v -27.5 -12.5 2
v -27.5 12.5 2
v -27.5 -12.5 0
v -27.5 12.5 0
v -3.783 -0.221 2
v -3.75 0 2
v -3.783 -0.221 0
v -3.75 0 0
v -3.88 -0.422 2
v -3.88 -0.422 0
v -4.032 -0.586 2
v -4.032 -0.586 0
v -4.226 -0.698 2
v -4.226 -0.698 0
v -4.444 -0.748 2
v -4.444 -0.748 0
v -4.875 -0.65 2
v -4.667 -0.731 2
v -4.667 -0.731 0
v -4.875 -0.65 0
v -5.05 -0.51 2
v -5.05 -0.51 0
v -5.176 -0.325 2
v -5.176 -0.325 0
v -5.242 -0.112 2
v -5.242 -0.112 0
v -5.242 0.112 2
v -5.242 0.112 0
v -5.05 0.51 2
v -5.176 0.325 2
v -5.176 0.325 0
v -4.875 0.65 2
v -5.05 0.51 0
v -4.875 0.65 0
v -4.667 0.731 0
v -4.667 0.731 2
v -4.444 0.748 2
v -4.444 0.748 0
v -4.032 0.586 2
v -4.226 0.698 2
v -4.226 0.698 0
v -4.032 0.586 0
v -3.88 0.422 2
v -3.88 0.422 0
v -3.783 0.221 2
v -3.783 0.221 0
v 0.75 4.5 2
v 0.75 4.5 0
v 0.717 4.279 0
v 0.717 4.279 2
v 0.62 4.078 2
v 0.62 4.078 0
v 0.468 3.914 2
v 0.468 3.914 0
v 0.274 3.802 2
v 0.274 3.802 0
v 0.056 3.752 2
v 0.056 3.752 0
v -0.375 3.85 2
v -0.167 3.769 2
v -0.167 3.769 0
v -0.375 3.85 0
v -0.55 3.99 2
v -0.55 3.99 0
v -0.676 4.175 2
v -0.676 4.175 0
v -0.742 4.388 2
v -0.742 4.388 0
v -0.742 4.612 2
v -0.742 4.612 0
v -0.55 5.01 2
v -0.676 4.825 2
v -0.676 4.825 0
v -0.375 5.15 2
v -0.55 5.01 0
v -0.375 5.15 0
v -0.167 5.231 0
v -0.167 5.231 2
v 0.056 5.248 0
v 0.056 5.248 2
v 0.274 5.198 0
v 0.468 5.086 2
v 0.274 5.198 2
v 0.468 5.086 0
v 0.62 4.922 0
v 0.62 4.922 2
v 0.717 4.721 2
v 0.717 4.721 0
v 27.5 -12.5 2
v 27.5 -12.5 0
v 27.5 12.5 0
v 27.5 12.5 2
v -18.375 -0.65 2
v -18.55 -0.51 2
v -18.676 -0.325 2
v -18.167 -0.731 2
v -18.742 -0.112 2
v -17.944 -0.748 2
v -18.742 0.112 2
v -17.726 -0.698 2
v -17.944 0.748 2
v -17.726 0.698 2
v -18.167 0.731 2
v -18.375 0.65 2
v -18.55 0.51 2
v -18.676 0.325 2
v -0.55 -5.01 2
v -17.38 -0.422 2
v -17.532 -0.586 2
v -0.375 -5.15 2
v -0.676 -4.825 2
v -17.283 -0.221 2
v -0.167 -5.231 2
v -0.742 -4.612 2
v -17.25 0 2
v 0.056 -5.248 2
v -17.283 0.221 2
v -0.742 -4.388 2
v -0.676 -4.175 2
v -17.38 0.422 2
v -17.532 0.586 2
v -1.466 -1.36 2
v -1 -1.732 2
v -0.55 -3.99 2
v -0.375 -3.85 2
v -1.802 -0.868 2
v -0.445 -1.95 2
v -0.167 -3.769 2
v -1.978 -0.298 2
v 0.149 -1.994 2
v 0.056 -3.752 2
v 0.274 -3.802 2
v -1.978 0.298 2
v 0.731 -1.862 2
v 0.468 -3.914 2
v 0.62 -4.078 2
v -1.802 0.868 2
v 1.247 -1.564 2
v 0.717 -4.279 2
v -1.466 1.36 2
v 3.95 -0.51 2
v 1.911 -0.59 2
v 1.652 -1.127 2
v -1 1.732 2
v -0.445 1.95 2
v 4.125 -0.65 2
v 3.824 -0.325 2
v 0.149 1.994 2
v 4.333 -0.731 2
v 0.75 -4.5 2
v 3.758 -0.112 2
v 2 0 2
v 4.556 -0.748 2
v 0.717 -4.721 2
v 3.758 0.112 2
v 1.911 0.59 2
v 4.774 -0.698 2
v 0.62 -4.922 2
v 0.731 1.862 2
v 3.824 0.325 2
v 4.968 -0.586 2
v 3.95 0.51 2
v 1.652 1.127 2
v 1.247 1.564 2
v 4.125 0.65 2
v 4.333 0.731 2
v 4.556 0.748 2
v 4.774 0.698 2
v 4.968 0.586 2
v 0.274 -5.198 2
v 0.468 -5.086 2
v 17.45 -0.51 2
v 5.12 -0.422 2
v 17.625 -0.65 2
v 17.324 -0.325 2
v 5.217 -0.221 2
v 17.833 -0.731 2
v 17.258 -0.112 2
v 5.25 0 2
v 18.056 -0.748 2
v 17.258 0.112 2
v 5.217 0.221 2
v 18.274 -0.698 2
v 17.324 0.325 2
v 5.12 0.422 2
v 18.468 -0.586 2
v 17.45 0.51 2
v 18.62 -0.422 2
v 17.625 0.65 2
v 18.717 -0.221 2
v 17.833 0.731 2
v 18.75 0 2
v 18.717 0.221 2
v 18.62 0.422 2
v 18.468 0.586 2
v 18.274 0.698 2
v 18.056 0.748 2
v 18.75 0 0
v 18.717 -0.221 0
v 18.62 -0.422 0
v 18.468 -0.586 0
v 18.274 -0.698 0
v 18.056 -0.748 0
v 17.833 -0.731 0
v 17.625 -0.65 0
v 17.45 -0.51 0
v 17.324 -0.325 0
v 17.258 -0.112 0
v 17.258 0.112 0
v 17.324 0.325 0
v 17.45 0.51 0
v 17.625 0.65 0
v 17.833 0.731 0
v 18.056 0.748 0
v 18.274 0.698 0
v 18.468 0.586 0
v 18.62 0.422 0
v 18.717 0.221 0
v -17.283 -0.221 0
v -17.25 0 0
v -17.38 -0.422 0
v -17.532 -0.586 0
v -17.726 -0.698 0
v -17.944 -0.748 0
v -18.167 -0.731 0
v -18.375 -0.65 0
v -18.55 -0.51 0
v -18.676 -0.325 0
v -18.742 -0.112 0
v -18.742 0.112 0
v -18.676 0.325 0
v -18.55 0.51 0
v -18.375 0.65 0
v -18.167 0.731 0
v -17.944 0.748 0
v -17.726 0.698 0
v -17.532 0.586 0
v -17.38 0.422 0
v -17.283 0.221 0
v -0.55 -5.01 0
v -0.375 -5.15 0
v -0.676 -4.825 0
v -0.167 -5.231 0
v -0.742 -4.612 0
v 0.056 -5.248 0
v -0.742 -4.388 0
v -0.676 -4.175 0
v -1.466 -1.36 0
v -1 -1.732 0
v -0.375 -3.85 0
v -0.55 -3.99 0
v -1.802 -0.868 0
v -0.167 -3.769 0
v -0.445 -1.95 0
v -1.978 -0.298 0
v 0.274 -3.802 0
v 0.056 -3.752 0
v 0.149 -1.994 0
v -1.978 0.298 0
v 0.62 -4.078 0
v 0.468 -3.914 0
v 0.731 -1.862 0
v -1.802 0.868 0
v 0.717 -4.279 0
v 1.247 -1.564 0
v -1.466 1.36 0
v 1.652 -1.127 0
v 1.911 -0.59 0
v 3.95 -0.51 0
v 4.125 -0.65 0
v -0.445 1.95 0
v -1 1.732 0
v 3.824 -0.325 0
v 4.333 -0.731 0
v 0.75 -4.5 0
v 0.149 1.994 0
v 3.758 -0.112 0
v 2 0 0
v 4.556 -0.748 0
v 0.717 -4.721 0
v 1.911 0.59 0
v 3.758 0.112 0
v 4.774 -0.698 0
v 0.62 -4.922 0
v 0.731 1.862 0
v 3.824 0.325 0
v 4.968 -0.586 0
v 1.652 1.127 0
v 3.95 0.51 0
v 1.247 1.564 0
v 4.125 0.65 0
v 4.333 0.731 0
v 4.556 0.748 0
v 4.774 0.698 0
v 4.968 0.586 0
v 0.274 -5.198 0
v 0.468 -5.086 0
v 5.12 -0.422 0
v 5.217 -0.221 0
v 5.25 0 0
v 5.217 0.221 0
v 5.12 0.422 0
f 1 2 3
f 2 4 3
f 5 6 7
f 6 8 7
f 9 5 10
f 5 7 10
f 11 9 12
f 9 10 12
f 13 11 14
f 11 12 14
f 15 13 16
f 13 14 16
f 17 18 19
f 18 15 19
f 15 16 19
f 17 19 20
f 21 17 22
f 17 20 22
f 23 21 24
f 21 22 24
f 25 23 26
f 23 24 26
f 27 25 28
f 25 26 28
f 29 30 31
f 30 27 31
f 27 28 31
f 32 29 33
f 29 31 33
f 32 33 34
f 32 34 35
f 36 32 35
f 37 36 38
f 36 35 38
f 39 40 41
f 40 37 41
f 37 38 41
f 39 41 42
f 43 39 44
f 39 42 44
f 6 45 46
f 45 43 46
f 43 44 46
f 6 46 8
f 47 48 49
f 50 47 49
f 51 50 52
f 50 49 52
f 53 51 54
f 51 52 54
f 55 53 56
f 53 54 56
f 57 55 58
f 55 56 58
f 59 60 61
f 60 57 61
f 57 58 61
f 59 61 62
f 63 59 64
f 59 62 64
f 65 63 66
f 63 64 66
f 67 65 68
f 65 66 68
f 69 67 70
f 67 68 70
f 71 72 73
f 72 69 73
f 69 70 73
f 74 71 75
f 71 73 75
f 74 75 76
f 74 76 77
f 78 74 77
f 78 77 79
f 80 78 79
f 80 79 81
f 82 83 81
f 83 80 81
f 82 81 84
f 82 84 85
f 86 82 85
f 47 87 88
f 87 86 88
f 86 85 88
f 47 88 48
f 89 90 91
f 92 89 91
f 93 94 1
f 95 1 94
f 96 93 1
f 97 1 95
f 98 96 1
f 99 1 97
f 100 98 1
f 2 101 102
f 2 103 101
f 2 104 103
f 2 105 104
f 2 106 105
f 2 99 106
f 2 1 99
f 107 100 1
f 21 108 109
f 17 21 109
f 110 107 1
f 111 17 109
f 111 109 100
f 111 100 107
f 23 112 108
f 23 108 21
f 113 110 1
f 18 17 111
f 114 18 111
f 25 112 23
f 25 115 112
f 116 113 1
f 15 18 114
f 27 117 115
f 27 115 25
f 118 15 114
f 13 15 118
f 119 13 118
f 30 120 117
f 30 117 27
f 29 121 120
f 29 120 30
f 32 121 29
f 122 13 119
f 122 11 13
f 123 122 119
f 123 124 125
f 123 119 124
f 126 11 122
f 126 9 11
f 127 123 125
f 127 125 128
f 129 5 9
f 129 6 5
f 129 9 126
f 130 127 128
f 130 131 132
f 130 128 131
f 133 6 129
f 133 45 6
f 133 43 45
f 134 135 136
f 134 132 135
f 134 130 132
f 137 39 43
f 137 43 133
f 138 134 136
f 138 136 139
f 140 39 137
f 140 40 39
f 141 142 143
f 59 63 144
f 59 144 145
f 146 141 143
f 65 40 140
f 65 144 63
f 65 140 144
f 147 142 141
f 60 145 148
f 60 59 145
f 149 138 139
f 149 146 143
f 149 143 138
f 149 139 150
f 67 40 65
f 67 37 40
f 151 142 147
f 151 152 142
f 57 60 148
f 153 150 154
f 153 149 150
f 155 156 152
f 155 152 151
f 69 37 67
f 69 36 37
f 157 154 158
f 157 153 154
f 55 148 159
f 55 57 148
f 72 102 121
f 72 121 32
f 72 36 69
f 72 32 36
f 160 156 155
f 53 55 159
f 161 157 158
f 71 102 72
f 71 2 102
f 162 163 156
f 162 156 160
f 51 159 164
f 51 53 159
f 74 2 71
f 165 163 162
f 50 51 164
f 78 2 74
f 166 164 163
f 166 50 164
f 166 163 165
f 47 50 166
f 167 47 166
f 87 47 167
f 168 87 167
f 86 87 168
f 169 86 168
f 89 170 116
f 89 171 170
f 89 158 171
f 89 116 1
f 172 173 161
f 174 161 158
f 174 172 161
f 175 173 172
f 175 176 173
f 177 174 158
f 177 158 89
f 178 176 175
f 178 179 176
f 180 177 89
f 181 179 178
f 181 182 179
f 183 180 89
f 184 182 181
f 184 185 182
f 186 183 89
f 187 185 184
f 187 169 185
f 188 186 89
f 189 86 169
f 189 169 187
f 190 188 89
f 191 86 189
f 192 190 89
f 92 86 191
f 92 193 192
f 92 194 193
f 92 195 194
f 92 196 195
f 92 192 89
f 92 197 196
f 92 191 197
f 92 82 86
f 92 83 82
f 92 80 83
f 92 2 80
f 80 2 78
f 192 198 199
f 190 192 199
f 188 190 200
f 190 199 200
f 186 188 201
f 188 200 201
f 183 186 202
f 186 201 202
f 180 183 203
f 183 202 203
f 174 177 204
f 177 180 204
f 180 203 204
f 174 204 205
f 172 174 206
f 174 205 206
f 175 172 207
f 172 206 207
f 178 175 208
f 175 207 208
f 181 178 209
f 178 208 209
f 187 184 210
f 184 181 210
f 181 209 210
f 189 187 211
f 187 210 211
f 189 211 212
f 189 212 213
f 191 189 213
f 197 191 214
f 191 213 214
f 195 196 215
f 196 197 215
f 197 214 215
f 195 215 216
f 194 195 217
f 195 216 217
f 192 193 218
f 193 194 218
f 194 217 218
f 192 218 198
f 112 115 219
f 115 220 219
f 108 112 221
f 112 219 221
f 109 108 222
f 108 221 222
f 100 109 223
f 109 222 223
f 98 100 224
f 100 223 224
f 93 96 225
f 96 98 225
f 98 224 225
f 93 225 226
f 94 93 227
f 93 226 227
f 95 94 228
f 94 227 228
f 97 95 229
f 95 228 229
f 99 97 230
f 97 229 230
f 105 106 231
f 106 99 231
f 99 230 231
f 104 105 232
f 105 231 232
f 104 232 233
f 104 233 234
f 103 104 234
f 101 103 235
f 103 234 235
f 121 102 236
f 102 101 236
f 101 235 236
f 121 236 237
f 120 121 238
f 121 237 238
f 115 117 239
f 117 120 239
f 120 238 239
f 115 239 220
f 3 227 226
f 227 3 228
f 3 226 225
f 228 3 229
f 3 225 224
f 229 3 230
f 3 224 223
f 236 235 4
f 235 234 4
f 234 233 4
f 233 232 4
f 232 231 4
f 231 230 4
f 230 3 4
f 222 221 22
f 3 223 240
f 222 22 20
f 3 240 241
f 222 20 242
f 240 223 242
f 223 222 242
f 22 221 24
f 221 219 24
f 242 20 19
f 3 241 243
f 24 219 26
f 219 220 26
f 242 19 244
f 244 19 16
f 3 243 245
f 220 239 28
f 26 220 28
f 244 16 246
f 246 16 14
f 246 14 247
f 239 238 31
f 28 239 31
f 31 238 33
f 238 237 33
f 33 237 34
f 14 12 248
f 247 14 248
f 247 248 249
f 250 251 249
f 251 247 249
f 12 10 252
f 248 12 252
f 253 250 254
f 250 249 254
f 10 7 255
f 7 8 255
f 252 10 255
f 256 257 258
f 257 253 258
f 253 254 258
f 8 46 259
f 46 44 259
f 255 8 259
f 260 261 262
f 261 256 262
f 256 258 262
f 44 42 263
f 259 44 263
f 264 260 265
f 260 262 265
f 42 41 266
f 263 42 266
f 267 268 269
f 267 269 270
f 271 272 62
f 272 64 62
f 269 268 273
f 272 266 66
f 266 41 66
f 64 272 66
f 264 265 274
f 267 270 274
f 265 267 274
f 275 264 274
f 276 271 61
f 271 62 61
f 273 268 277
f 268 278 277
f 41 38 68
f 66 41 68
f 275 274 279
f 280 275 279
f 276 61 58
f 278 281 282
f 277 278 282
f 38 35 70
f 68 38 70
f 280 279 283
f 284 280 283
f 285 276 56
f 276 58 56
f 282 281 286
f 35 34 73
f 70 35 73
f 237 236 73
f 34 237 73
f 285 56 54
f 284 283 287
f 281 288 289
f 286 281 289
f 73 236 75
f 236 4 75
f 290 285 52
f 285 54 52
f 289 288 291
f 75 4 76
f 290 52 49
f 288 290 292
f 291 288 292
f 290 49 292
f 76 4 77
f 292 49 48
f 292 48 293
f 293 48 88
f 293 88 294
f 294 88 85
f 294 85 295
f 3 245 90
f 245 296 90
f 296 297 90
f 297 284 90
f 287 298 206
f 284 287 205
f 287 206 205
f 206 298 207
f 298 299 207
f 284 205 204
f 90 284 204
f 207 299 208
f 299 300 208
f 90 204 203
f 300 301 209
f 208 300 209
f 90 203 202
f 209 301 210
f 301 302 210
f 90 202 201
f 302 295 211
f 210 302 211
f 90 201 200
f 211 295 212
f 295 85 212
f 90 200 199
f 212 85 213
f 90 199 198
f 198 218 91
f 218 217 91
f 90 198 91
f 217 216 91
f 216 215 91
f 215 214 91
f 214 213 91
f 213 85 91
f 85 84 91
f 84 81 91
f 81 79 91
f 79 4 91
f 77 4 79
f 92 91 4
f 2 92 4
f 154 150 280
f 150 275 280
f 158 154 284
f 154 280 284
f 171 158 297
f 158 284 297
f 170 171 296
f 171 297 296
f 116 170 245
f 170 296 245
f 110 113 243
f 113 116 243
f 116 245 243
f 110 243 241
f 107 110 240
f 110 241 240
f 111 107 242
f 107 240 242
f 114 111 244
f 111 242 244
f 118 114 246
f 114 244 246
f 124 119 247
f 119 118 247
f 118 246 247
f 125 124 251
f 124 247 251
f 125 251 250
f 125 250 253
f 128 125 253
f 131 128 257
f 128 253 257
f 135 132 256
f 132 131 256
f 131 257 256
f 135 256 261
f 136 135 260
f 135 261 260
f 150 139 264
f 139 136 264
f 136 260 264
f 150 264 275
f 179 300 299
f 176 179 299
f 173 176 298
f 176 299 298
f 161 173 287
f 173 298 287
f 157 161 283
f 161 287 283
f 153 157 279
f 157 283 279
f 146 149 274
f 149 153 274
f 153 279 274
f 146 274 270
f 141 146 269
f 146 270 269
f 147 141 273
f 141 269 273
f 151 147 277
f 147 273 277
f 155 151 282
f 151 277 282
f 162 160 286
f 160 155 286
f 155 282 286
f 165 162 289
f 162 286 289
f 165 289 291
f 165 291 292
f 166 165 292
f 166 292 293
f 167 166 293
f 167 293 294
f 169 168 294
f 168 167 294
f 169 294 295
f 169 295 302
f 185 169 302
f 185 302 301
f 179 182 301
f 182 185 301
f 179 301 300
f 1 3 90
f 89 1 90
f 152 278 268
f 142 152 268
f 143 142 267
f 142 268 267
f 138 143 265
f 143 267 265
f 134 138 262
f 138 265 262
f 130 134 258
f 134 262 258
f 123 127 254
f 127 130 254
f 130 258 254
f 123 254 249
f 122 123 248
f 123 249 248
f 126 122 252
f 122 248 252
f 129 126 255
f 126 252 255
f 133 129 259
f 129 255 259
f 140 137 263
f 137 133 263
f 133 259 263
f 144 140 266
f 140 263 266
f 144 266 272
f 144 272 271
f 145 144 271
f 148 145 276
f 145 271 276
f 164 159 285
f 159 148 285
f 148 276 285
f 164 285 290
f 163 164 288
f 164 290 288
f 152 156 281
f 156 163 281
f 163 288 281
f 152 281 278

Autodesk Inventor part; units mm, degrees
ref_plane "YZ Plane" through (0, 0, 0) normal (1, 0, 0) x (0, 1, 0)
ref_plane "XZ Plane" through (0, 0, 0) normal (0, 1, 0) x (-1, 0, 0)
ref_plane "XY Plane" through (0, 0, 0) normal (0, 0, 1) x (1, 0, 0)
sketch "Boceto1" plane through (0, 0, 0) normal (0, 0, 1) x (1, 0, 0)
  line L0 (-27.5, -12.5) -> (27.5, -12.5)
  line L1 (27.5, -12.5) -> (27.5, 12.5)
  line L2 (27.5, 12.5) -> (-27.5, 12.5)
  line L3 (-27.5, 12.5) -> (-27.5, -12.5)
  line L4 (-27.5, -12.5) -> (27.5, 12.5) construction
  line L5 (27.5, -12.5) -> (-27.5, 12.5) construction
  circle A0 centre (0, 0) radius 2
  circle A1 centre (0, -4.5) radius 0.75
  circle A2 centre (0, 4.5) radius 0.75
  circle A3 centre (4.5, 0) radius 0.75
  circle A4 centre (-4.5, 0) radius 0.75
  line L6 (0, 0) -> (18, 0) construction
  line L7 (0, 0) -> (18, 0) construction
  circle A5 centre (-18, 0) radius 0.75
  circle A6 centre (18, 0) radius 0.75
  dimension "d0" = 55
  dimension "d1" = 25
  dimension "d2" = 4
  dimension "d4" = 1.5
  dimension "d8" = 1.5
  dimension "d9" = 1.5
  dimension "d10" = 1.5
  dimension "d15" = 1.5
  dimension "d16" = 1.5
extrude "Extrusión1" add sketch "Boceto1" along normal blind 2
sketch "Boceto2" plane through (0, 0, 0) normal (1, 0, 0) x (0, 1, 0)
  point P0 (-12.5, 0)
sketch "Boceto3" plane through (0, 0, 2) normal (0, 0, 1) x (1, 0, 0)
  point P0 (0, 0)
properties part number "frontal" material "Acero, galvanizado"
